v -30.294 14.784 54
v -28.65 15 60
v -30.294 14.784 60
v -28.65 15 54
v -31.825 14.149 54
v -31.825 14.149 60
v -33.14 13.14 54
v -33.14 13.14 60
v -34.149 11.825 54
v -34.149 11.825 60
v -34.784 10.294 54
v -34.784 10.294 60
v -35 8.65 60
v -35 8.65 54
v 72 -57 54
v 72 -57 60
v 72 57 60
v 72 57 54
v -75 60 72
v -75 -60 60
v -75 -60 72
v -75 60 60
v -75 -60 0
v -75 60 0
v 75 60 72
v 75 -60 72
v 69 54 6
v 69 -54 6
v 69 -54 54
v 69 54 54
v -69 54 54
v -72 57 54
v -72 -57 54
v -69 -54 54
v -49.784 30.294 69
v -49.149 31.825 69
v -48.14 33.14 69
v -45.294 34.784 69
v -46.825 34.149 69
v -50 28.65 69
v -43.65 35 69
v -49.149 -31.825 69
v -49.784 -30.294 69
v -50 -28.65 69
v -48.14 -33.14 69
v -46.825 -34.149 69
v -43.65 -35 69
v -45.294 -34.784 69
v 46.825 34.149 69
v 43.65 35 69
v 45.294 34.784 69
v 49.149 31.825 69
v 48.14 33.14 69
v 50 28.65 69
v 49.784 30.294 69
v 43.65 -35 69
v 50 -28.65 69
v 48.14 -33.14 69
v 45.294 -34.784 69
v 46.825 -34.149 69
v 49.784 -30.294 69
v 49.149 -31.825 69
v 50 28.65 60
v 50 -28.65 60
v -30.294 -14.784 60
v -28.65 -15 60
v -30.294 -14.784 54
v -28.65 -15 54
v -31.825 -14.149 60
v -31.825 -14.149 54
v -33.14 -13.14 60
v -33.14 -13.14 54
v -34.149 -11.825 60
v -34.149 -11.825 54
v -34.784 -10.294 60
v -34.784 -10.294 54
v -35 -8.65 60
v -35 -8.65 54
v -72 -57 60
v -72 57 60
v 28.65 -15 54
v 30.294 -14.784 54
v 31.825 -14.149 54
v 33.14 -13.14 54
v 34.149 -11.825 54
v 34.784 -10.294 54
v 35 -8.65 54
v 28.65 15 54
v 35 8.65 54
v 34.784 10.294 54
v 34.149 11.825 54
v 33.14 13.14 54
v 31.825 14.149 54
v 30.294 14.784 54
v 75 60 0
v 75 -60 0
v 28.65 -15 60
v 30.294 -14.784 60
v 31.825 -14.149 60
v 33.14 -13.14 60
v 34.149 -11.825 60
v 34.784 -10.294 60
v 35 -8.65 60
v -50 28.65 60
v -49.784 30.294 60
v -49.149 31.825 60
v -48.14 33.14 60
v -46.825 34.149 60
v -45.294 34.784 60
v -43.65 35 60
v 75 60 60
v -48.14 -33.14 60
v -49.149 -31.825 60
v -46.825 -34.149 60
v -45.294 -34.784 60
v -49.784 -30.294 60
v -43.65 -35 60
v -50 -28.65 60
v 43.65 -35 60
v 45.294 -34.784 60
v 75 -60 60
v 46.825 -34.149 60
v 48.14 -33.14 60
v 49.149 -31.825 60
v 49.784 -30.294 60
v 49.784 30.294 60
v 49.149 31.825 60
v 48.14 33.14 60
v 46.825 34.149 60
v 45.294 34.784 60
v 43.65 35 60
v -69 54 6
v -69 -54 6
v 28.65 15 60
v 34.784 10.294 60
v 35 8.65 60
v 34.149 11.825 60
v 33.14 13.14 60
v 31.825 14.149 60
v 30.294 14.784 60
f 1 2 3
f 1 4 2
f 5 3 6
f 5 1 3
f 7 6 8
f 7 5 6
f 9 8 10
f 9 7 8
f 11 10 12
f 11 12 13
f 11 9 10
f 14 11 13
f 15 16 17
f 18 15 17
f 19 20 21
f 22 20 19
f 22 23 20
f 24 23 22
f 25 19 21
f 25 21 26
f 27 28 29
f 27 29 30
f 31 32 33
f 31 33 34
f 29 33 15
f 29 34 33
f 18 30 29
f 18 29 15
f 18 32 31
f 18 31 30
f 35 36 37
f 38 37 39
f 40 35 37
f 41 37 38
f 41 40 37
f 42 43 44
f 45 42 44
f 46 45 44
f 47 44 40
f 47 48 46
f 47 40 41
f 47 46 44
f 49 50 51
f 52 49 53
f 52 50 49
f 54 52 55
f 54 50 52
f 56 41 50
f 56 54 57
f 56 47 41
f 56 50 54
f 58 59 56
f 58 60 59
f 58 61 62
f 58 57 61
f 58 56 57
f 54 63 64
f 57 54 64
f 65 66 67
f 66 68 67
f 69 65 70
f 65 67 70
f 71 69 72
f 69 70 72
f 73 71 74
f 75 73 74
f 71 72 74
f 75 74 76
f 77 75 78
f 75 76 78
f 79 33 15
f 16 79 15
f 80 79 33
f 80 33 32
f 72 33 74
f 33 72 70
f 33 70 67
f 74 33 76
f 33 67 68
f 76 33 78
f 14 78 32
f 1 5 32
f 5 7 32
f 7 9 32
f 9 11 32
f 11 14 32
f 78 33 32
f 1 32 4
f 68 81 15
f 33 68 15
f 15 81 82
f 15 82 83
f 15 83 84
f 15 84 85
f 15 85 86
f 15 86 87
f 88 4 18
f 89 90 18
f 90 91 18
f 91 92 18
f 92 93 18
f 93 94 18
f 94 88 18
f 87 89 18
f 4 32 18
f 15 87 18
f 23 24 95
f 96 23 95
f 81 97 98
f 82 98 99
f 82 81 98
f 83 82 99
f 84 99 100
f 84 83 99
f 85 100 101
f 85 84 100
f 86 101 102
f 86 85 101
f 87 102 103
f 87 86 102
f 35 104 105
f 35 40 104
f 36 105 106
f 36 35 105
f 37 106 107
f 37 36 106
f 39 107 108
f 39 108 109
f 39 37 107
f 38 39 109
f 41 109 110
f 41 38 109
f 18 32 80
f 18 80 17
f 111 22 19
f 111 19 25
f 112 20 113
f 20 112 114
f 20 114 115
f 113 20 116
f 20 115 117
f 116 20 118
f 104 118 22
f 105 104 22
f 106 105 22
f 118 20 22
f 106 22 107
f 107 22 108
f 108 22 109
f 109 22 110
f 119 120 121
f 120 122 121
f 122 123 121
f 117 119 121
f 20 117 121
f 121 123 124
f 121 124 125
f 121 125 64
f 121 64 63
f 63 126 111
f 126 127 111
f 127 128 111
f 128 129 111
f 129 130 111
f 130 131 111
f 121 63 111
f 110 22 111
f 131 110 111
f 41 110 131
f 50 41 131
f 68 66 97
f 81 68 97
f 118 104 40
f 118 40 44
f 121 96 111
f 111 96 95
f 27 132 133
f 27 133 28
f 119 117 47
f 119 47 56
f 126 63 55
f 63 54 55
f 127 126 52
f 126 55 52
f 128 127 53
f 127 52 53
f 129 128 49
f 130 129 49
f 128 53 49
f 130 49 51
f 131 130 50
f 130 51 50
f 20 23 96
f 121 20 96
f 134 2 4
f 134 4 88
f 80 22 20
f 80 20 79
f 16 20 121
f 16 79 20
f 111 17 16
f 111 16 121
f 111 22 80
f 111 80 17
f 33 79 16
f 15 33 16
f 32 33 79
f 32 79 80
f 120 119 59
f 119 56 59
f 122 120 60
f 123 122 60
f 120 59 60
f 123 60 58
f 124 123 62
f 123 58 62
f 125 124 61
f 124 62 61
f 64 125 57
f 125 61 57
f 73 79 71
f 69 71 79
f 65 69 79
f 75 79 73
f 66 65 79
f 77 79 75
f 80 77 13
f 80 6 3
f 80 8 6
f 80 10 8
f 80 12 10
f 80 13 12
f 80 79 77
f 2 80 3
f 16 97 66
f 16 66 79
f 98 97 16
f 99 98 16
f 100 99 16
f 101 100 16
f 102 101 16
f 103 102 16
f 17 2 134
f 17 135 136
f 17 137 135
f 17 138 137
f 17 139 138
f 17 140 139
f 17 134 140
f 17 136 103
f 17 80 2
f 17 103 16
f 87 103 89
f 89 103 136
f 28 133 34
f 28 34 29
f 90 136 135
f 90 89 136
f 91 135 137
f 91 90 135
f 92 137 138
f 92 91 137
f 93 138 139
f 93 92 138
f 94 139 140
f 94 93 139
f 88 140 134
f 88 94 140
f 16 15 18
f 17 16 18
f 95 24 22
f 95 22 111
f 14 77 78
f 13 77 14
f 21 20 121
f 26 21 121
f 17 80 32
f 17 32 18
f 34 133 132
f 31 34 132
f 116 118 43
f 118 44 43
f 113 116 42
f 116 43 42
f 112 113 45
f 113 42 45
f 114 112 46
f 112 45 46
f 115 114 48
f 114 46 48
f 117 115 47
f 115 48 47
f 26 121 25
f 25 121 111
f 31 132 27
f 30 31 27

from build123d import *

# Parameters (mm, degrees)
F0_W      = 150
F0_H      = 120
F1_DEPTH  = 60
F2_T      = -6
F3_W      = 144
F3_H      = 114
F4_DEPTH  = 6
F5_W      = 144
F5_H      = 114
F6_DEPTH  = 6
F7_W      = 70
F7_H      = 30
F8_DEPTH  = 60.001
F9_R      = 6.35
F10_W     = 150
F10_H     = 120
F11_DEPTH = 12
F12_W     = 100
F12_H     = 70
F13_DEPTH = 9
F14_R     = 6.35


with BuildPart() as f1:
    # F0 (on Top) → F1 (new body)
    with BuildSketch(Plane.XY):
        Rectangle(F0_W, F0_H)
    extrude(amount=F1_DEPTH)

    # F2
    f2_openings = [f1.faces().sort_by_distance(p)[0] for p in [
        (0, 0, 60),
    ]]
    offset(amount=F2_T, openings=f2_openings)

    # F3 (on face) → F4 (cut)
    with BuildSketch(Plane.XY.offset(60)):
        Rectangle(F3_W, F3_H)
    extrude(amount=-F4_DEPTH, mode=Mode.SUBTRACT)


with BuildPart() as f6:
    # F5 (on face) → F6 (new body)
    with BuildSketch(Plane.XY.offset(54)):
        Rectangle(F5_W, F5_H)
    extrude(amount=F6_DEPTH)

    # F7 (on face) → F8 (cut, through all)
    with BuildSketch(Plane.XY.offset(60)):
        Rectangle(F7_W, F7_H)
    extrude(amount=-F8_DEPTH, mode=Mode.SUBTRACT)

    # F9
    f9_edges = [f6.edges().sort_by_distance(p)[0] for p in [
        (-35, 15, 57),
        (35, 15, 57),
        (-35, -15, 57),
        (35, -15, 57),
    ]]
    fillet(f9_edges, radius=F9_R)


with BuildPart() as f11:
    # F10 (on face) → F11 (new body)
    with BuildSketch(Plane.XY.offset(60)):
        Rectangle(F10_W, F10_H)
    extrude(amount=F11_DEPTH)

    # F12 (on face) → F13 (cut)
    with BuildSketch(Plane(origin=(0, 0, 60), x_dir=(1, 0, 0), z_dir=(0, 0, -1))):
        Rectangle(F12_W, F12_H)
    extrude(amount=-F13_DEPTH, mode=Mode.SUBTRACT)

    # F14
    f14_edges = [f11.edges().sort_by_distance(p)[0] for p in [
        (-50, 35, 64.5),
        (-50, -35, 64.5),
        (50, -35, 64.5),
        (50, 35, 64.5),
    ]]
    fillet(f14_edges, radius=F14_R)


solid = Compound([f1.part, f6.part, f11.part])
